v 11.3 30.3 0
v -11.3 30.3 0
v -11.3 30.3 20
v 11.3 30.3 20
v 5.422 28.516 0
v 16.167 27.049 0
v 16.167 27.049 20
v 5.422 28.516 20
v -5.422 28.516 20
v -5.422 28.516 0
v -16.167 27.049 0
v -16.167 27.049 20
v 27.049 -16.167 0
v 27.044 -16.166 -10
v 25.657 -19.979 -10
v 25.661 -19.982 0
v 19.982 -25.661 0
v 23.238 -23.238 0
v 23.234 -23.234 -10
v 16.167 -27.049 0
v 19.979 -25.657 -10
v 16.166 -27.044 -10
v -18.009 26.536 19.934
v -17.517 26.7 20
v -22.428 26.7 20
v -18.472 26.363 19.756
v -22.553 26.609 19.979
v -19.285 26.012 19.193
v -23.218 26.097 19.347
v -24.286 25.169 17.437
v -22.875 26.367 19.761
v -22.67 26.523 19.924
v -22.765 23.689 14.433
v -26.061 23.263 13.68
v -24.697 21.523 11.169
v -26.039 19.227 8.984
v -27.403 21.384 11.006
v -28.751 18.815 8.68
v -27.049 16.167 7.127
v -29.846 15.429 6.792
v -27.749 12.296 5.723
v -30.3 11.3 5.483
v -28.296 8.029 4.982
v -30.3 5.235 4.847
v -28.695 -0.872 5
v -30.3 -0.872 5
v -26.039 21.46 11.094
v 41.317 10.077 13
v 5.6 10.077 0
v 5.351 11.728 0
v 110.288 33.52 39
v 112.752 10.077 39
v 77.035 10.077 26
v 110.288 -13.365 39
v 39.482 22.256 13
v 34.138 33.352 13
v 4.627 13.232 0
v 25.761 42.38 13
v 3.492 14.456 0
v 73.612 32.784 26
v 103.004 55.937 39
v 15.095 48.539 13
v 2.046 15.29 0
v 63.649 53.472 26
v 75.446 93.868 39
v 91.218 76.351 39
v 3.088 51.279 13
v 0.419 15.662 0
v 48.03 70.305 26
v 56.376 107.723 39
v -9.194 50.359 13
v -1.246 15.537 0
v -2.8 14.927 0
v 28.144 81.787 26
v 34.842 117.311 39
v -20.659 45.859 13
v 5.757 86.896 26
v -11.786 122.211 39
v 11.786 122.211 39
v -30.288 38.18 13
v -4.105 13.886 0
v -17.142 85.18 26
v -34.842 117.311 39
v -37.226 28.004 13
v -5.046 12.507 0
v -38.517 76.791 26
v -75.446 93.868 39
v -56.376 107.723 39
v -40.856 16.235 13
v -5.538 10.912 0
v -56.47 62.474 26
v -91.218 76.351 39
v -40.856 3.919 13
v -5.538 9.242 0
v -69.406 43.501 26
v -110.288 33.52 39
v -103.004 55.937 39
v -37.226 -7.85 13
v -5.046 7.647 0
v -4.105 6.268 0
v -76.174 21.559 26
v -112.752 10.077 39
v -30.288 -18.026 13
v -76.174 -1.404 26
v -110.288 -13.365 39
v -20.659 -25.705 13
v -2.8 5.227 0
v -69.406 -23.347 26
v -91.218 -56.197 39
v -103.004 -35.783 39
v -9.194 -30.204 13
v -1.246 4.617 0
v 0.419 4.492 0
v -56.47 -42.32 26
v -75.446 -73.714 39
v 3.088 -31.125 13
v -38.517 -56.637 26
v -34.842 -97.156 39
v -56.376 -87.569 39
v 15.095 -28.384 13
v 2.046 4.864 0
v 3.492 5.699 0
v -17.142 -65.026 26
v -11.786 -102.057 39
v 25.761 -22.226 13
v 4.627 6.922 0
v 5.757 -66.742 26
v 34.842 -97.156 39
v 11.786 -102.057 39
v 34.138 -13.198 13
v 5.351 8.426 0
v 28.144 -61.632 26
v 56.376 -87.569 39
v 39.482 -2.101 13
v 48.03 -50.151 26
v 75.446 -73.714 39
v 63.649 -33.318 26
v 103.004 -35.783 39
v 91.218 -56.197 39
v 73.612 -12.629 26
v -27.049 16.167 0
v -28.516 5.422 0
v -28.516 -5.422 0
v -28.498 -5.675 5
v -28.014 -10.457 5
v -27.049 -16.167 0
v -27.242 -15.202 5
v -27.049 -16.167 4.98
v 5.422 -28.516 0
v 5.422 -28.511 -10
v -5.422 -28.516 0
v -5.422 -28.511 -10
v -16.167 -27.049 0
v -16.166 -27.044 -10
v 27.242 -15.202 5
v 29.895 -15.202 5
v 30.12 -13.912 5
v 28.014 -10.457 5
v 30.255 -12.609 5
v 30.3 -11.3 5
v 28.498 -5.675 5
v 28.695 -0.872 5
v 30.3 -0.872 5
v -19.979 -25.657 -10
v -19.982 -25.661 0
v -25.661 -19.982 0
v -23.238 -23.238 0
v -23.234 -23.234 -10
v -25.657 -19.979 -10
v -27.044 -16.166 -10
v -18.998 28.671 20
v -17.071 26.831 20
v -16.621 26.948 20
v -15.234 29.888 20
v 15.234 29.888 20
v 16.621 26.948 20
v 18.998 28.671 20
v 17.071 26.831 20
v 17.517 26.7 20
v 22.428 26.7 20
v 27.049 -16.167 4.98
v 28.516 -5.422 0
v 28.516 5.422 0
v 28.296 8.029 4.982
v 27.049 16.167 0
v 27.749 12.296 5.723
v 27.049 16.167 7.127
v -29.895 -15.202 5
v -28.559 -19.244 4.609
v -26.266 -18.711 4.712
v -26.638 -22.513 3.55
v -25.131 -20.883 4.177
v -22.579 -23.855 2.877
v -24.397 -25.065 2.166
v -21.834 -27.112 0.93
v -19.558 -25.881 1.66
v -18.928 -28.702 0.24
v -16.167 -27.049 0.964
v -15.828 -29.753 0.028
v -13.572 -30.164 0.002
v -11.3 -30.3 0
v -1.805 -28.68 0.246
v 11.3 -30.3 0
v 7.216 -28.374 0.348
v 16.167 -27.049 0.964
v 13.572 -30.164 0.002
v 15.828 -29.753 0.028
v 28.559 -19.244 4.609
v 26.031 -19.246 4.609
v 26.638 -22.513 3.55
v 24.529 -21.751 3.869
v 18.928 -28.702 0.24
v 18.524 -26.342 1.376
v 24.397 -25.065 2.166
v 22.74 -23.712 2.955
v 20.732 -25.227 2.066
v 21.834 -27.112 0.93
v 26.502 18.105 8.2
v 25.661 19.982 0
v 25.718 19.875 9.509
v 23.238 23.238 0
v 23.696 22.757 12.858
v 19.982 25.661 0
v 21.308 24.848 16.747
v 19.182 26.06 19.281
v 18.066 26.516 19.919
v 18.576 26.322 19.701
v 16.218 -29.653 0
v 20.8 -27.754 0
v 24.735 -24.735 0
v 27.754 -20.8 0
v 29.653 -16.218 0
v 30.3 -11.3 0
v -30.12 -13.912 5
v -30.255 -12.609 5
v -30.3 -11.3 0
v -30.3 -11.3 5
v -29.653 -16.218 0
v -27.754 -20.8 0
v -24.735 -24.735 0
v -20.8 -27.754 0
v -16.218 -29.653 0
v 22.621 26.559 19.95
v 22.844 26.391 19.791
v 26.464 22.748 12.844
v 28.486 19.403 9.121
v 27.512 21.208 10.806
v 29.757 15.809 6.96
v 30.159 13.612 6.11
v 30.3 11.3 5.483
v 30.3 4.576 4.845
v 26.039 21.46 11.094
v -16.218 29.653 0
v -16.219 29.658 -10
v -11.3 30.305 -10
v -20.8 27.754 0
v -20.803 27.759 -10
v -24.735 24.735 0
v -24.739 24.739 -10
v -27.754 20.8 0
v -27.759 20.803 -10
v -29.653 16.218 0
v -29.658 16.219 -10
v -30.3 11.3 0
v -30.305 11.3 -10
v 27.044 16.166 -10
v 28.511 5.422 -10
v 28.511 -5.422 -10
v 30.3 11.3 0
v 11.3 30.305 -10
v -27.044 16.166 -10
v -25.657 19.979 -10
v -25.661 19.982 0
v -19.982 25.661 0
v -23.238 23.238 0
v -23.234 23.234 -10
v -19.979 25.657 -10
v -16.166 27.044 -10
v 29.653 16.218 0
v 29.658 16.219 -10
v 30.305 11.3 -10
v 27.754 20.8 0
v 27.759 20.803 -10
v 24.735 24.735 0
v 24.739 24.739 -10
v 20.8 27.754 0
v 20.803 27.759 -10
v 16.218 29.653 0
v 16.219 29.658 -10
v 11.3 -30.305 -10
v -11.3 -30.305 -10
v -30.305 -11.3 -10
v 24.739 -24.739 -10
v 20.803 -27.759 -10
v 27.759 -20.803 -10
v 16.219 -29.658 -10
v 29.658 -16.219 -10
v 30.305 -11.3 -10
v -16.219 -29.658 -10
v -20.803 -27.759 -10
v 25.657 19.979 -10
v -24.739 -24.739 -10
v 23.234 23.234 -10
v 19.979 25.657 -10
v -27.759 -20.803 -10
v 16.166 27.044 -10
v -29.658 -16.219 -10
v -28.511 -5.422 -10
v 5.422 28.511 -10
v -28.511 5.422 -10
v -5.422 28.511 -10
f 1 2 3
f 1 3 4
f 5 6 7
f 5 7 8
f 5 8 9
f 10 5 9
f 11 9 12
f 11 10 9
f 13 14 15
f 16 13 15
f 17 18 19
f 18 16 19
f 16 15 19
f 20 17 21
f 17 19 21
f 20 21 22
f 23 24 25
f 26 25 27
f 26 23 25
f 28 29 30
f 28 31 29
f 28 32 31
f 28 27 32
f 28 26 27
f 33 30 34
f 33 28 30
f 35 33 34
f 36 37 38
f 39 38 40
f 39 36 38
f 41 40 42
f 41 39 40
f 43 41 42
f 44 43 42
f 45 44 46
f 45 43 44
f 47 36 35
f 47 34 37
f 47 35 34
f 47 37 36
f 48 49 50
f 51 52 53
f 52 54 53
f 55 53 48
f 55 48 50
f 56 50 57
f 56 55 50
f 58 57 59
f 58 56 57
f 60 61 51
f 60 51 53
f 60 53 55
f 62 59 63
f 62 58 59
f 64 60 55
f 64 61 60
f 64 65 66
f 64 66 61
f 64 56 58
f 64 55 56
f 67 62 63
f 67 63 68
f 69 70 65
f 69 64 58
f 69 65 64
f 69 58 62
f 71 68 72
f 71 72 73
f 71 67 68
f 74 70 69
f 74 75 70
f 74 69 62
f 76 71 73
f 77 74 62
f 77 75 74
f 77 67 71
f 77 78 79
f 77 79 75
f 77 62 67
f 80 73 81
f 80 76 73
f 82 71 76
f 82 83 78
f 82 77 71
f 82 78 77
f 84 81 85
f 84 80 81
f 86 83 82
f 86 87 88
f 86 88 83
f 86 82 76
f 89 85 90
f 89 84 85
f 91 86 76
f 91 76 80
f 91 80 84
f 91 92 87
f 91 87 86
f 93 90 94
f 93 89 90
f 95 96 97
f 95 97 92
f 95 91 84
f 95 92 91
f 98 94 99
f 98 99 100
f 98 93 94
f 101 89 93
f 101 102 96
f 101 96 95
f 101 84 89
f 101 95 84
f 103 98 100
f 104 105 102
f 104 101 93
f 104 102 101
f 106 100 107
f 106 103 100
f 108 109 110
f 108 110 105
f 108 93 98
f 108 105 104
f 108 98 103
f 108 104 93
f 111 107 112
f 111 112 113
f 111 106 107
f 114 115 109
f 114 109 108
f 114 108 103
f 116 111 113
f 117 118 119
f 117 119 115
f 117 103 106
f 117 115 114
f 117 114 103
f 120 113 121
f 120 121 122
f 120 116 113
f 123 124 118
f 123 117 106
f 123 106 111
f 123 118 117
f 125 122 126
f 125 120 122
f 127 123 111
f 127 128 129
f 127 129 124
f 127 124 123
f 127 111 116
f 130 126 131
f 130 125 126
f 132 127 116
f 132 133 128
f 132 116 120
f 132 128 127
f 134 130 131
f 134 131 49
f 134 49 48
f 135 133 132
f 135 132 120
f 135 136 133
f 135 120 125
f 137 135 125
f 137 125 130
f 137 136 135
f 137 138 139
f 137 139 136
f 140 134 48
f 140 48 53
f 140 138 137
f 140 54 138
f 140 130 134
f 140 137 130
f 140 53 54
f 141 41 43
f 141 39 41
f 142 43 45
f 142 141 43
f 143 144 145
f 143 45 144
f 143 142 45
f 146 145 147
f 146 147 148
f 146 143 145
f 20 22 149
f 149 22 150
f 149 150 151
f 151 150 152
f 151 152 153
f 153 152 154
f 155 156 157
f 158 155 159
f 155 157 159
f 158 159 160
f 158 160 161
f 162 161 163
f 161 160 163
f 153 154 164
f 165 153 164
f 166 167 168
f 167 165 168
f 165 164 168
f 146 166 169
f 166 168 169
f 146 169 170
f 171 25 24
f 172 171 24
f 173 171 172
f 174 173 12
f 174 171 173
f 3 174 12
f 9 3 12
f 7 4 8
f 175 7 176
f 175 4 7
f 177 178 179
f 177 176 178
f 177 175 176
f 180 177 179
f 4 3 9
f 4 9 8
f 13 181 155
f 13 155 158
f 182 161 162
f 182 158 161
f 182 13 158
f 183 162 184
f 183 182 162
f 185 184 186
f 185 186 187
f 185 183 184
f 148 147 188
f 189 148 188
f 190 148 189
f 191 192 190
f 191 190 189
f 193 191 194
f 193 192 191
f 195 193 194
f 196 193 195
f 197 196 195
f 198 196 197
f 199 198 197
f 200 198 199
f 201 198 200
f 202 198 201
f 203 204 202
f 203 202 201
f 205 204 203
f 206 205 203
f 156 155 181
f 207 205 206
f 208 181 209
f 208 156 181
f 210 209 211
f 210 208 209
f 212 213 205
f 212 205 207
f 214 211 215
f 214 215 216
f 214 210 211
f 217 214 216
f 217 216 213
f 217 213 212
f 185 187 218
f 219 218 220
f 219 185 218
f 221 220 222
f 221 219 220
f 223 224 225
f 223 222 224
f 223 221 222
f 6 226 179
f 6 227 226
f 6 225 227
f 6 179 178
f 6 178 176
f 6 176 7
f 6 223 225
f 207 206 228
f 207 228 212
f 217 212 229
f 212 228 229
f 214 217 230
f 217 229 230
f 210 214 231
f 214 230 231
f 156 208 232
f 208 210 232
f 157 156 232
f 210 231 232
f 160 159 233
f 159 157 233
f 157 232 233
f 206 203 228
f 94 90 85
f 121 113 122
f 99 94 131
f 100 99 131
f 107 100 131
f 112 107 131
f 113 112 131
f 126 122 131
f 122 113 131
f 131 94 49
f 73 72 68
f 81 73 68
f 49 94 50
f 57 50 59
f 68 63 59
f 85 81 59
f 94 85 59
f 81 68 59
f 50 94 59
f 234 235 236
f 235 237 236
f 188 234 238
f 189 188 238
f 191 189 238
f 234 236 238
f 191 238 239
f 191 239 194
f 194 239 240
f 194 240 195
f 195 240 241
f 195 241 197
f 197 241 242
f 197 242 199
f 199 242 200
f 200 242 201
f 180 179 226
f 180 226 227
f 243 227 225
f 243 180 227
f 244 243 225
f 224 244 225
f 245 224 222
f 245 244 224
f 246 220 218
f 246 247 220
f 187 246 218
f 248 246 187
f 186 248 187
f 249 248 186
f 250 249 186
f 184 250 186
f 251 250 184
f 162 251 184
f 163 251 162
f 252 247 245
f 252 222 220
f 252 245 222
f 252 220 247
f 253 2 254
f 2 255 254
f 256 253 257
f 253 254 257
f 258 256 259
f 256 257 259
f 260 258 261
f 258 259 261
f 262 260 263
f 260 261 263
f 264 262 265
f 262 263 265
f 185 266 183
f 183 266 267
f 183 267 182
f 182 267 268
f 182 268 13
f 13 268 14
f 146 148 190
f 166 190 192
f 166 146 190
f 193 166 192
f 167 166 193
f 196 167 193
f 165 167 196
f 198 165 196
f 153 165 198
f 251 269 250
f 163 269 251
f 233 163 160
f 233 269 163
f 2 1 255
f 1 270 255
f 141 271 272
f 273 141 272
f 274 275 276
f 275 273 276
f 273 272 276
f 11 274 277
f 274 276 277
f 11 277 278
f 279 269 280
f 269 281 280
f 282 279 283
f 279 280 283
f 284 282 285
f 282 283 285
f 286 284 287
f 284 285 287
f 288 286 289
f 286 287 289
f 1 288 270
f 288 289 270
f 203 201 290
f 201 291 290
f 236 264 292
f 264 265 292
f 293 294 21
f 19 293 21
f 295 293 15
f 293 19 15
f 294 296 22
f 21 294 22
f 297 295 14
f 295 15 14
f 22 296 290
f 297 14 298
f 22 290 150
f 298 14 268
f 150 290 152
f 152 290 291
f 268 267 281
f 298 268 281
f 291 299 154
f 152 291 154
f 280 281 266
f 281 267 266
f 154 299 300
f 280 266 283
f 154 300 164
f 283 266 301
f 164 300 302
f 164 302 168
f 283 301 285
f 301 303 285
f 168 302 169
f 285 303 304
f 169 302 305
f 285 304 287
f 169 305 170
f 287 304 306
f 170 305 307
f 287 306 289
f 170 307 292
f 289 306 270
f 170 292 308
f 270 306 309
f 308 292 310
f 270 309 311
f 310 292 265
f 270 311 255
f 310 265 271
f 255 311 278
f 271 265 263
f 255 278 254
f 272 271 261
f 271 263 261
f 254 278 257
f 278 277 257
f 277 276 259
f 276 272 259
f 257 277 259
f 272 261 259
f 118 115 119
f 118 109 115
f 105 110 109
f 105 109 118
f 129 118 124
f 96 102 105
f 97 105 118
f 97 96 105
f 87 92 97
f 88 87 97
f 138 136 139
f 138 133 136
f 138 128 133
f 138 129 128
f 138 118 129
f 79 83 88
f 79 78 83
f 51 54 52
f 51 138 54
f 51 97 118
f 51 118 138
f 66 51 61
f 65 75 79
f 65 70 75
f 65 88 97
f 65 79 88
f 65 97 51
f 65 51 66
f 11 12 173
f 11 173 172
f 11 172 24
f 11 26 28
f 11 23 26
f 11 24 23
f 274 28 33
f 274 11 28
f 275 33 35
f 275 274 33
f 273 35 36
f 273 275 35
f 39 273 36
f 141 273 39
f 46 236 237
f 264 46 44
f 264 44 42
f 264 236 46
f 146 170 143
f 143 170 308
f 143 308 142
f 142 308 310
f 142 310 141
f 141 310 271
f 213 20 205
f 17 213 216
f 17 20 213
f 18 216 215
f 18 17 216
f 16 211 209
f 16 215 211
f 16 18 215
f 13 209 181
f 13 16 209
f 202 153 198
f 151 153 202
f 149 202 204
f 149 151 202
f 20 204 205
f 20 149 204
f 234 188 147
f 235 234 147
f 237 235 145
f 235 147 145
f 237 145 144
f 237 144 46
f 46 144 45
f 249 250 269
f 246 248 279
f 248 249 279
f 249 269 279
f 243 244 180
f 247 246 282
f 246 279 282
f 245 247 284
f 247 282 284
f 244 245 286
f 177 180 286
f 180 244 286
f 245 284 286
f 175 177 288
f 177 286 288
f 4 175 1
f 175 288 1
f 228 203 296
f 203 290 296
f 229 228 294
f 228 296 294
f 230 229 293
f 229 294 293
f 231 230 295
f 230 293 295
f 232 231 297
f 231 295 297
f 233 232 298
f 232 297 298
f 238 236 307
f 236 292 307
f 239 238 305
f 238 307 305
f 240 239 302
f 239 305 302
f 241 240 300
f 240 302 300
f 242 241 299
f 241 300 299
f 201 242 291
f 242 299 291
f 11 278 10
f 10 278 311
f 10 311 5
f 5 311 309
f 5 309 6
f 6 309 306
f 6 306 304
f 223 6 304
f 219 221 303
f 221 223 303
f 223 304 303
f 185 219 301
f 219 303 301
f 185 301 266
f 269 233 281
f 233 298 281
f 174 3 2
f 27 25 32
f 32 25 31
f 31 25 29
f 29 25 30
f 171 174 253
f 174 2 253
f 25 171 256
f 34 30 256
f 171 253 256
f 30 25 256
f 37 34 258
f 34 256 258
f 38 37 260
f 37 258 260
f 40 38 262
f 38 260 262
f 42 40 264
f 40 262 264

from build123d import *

# Parameters (mm, degrees)
PAD_DEPTH    = 10
PAD_TAPER    = -0.03
PAD001_DEPTH = 20
POCKET_DEPTH = 60.606236
SKETCH002_R  = 5.600293
PAD002_DEPTH = 39
PAD002_TAPER = -70


with BuildPart() as body:
    # Sketch → Pad (new body)
    with BuildSketch(Plane.XY):
        with BuildLine():
            ThreePointArc((-11.3, 30.3), (-24.735029, 24.735029), (-30.3, 11.3))
            Line((-30.3, -11.3), (-30.3, 11.3))
            ThreePointArc((-30.3, -11.3), (-24.735029, -24.735029), (-11.3, -30.3))
            Line((11.3, -30.3), (-11.3, -30.3))
            ThreePointArc((11.3, -30.3), (24.735029, -24.735029), (30.3, -11.3))
            Line((30.3, 11.3), (30.3, -11.3))
            ThreePointArc((30.3, 11.3), (24.735029, 24.735029), (11.3, 30.3))
            Line((-11.3, 30.3), (11.3, 30.3))
        make_face()
        with BuildLine():
            ThreePointArc((-16.16748, 27.049299), (-23.237666, 23.237666), (-27.049299, 16.16748))
            ThreePointArc((-27.049299, 16.16748), (-28.7, 0), (-27.049299, -16.16748))
            ThreePointArc((-27.049299, -16.16748), (-23.237666, -23.237666), (-16.16748, -27.049299))
            ThreePointArc((-16.16748, -27.049299), (0, -28.7), (16.16748, -27.049299))
            ThreePointArc((16.16748, -27.049299), (23.237666, -23.237666), (27.049299, -16.16748))
            ThreePointArc((27.049299, -16.16748), (28.7, 0), (27.049299, 16.16748))
            ThreePointArc((27.049299, 16.16748), (23.237666, 23.237666), (16.16748, 27.049299))
            ThreePointArc((16.16748, 27.049299), (0, 28.7), (-16.16748, 27.049299))
        make_face(mode=Mode.SUBTRACT)
    extrude(amount=-PAD_DEPTH, taper=PAD_TAPER)

    # Sketch → Pad001 (join)
    with BuildSketch(Plane.XY):
        with BuildLine():
            ThreePointArc((-11.3, 30.3), (-24.735029, 24.735029), (-30.3, 11.3))
            Line((-30.3, -11.3), (-30.3, 11.3))
            ThreePointArc((-30.3, -11.3), (-24.735029, -24.735029), (-11.3, -30.3))
            Line((11.3, -30.3), (-11.3, -30.3))
            ThreePointArc((11.3, -30.3), (24.735029, -24.735029), (30.3, -11.3))
            Line((30.3, 11.3), (30.3, -11.3))
            ThreePointArc((30.3, 11.3), (24.735029, 24.735029), (11.3, 30.3))
            Line((-11.3, 30.3), (11.3, 30.3))
        make_face()
        with BuildLine():
            ThreePointArc((-16.16748, 27.049299), (-23.237666, 23.237666), (-27.049299, 16.16748))
            ThreePointArc((-27.049299, 16.16748), (-28.7, 0), (-27.049299, -16.16748))
            ThreePointArc((-27.049299, -16.16748), (-23.237666, -23.237666), (-16.16748, -27.049299))
            ThreePointArc((-16.16748, -27.049299), (0, -28.7), (16.16748, -27.049299))
            ThreePointArc((16.16748, -27.049299), (23.237666, -23.237666), (27.049299, -16.16748))
            ThreePointArc((27.049299, -16.16748), (28.7, 0), (27.049299, 16.16748))
            ThreePointArc((27.049299, 16.16748), (23.237666, 23.237666), (16.16748, 27.049299))
            ThreePointArc((16.16748, 27.049299), (0, 28.7), (-16.16748, 27.049299))
        make_face(mode=Mode.SUBTRACT)
    extrude(amount=PAD001_DEPTH)

    # Sketch001 (on Face26 of Pad001) → Pocket (cut, through all)
    with BuildSketch(Plane.YZ.offset(30.3)):
        with BuildLine():
            Line((26.7, 20), (-30.3, 20))
            Line((-30.3, 20), (-30.3, 0))
            add(Edge.make_bspline(
                [(-15.202236, 5), (-24.200268, 5), (-25.999708, 0), (-30.3, 0)],
                knots=[0, 0, 0, 0, 1, 1, 1, 1], degree=3))
            Line((-15.202236, 5), (-0.871639, 5))
            add(Edge.make_bspline(
                [(26.7, 20), (25.897927, 20), (23.047305, 9.276816), (9.244787, 4.096733), (1.866701, 5), (-0.871639, 5)],
                knots=[0, 0, 0, 0, 0.333333, 0.666667, 1, 1, 1, 1], degree=3))
        make_face()
    extrude(amount=-POCKET_DEPTH, mode=Mode.SUBTRACT)


with BuildPart() as body001:
    # Sketch002 → Pad002 (new body)
    with BuildSketch(Plane.XY):
        with Locations((0, 10.077132)):
            Circle(SKETCH002_R)
    extrude(amount=PAD002_DEPTH, taper=PAD002_TAPER)


solid = Compound([body.part, body001.part])
